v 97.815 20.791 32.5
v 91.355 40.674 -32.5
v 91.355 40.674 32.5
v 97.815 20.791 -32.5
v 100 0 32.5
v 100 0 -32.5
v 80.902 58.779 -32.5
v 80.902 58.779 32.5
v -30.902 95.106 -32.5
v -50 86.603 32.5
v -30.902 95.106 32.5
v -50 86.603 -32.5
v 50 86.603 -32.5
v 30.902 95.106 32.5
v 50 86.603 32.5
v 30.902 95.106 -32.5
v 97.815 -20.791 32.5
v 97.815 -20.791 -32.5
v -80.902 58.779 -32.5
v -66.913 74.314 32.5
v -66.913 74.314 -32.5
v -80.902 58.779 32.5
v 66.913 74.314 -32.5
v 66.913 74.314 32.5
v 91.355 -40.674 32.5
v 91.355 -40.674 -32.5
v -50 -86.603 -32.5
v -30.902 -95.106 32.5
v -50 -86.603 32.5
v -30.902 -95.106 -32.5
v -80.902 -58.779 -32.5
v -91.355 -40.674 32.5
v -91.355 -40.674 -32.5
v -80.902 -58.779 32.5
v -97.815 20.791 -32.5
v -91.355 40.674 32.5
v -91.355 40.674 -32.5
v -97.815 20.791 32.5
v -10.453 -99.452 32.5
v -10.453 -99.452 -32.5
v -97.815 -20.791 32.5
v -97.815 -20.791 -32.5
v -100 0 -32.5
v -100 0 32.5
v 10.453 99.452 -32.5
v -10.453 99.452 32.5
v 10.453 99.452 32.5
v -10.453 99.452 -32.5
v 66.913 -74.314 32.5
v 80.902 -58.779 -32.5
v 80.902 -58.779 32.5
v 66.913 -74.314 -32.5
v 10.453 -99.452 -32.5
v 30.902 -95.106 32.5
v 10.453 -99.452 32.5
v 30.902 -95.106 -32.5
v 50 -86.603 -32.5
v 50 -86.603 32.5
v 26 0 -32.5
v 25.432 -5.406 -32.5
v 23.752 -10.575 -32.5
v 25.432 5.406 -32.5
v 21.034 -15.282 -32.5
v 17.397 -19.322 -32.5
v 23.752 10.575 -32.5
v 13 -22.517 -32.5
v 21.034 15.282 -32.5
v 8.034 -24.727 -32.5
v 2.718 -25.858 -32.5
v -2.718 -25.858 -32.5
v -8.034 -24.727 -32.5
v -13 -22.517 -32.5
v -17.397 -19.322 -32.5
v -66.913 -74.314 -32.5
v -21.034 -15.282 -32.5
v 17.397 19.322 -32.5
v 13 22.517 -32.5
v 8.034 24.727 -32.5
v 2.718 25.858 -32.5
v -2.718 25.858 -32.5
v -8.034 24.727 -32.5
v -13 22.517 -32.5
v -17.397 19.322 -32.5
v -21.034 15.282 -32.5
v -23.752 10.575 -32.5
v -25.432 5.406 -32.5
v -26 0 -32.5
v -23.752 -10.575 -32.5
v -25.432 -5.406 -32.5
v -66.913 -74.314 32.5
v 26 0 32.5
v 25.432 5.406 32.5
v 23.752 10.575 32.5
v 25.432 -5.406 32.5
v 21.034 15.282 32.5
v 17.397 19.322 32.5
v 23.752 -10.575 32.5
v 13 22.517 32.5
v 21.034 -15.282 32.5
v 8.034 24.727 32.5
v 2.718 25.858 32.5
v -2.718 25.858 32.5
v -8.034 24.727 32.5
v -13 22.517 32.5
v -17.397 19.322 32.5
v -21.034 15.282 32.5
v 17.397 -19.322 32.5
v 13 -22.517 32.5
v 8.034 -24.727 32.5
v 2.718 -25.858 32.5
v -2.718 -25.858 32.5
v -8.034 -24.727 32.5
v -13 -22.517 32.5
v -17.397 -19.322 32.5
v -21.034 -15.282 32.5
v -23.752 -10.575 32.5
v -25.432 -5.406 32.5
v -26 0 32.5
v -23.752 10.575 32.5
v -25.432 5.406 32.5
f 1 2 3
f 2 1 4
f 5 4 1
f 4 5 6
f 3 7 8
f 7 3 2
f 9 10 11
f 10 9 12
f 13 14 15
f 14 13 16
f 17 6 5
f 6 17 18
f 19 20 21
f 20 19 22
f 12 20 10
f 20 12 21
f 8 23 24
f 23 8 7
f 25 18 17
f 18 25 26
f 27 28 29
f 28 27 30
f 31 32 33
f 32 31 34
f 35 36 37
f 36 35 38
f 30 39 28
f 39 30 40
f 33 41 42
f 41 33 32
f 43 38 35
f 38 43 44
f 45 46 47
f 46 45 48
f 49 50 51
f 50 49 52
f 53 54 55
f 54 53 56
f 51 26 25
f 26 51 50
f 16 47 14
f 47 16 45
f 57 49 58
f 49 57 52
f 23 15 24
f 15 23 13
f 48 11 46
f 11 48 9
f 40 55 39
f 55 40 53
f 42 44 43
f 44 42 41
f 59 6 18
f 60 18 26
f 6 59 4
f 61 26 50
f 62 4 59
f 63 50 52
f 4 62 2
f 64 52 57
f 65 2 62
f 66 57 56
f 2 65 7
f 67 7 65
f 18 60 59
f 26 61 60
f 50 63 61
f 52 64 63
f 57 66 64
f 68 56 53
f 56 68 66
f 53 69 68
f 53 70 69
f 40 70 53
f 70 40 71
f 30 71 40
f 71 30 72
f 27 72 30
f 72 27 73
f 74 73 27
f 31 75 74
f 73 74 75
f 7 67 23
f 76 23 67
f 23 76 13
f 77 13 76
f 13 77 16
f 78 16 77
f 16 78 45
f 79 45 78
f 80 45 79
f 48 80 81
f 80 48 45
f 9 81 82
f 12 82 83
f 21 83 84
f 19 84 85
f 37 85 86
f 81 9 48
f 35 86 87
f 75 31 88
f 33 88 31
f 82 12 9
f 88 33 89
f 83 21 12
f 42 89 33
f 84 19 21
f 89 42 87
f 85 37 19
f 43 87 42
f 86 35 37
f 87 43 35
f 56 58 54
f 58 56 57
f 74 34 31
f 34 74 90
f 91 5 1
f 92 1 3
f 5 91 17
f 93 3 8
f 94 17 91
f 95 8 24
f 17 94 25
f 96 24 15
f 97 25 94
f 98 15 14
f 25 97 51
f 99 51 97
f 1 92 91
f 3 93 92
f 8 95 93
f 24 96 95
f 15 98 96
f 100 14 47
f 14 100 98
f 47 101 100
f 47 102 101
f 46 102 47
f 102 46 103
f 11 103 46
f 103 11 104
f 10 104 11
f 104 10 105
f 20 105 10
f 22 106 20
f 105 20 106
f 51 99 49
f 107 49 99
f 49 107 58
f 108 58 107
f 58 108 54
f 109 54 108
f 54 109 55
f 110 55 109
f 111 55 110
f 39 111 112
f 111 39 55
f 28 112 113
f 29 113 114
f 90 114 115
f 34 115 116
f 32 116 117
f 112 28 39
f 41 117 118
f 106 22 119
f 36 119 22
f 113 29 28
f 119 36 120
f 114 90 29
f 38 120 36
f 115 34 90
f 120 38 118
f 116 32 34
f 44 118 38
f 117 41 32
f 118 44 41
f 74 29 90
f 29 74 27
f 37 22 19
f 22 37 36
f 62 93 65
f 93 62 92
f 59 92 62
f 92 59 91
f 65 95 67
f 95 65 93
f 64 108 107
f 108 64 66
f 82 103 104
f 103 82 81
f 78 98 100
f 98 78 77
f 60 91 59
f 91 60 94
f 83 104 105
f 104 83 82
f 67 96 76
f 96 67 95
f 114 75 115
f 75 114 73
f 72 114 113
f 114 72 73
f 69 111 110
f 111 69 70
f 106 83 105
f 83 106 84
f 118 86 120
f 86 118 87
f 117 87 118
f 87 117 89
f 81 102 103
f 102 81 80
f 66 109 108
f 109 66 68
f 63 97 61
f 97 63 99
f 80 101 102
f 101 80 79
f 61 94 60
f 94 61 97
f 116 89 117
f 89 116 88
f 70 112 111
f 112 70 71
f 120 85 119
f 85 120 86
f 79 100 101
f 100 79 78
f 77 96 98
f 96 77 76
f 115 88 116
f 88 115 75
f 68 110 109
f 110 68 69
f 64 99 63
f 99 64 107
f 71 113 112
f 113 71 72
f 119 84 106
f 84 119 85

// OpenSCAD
// PETG-CF filament spool placeholder for BOM visualization.

module petg_cf_filament(col = [0.08, 0.08, 0.08]) {
    outer_d = 200;
    inner_d = 52;
    width = 65;
    color(col) difference() {
        cylinder(d = outer_d, h = width, center = true);
        cylinder(d = inner_d, h = width + 0.2, center = true);
    }
}

petg_cf_filament();
